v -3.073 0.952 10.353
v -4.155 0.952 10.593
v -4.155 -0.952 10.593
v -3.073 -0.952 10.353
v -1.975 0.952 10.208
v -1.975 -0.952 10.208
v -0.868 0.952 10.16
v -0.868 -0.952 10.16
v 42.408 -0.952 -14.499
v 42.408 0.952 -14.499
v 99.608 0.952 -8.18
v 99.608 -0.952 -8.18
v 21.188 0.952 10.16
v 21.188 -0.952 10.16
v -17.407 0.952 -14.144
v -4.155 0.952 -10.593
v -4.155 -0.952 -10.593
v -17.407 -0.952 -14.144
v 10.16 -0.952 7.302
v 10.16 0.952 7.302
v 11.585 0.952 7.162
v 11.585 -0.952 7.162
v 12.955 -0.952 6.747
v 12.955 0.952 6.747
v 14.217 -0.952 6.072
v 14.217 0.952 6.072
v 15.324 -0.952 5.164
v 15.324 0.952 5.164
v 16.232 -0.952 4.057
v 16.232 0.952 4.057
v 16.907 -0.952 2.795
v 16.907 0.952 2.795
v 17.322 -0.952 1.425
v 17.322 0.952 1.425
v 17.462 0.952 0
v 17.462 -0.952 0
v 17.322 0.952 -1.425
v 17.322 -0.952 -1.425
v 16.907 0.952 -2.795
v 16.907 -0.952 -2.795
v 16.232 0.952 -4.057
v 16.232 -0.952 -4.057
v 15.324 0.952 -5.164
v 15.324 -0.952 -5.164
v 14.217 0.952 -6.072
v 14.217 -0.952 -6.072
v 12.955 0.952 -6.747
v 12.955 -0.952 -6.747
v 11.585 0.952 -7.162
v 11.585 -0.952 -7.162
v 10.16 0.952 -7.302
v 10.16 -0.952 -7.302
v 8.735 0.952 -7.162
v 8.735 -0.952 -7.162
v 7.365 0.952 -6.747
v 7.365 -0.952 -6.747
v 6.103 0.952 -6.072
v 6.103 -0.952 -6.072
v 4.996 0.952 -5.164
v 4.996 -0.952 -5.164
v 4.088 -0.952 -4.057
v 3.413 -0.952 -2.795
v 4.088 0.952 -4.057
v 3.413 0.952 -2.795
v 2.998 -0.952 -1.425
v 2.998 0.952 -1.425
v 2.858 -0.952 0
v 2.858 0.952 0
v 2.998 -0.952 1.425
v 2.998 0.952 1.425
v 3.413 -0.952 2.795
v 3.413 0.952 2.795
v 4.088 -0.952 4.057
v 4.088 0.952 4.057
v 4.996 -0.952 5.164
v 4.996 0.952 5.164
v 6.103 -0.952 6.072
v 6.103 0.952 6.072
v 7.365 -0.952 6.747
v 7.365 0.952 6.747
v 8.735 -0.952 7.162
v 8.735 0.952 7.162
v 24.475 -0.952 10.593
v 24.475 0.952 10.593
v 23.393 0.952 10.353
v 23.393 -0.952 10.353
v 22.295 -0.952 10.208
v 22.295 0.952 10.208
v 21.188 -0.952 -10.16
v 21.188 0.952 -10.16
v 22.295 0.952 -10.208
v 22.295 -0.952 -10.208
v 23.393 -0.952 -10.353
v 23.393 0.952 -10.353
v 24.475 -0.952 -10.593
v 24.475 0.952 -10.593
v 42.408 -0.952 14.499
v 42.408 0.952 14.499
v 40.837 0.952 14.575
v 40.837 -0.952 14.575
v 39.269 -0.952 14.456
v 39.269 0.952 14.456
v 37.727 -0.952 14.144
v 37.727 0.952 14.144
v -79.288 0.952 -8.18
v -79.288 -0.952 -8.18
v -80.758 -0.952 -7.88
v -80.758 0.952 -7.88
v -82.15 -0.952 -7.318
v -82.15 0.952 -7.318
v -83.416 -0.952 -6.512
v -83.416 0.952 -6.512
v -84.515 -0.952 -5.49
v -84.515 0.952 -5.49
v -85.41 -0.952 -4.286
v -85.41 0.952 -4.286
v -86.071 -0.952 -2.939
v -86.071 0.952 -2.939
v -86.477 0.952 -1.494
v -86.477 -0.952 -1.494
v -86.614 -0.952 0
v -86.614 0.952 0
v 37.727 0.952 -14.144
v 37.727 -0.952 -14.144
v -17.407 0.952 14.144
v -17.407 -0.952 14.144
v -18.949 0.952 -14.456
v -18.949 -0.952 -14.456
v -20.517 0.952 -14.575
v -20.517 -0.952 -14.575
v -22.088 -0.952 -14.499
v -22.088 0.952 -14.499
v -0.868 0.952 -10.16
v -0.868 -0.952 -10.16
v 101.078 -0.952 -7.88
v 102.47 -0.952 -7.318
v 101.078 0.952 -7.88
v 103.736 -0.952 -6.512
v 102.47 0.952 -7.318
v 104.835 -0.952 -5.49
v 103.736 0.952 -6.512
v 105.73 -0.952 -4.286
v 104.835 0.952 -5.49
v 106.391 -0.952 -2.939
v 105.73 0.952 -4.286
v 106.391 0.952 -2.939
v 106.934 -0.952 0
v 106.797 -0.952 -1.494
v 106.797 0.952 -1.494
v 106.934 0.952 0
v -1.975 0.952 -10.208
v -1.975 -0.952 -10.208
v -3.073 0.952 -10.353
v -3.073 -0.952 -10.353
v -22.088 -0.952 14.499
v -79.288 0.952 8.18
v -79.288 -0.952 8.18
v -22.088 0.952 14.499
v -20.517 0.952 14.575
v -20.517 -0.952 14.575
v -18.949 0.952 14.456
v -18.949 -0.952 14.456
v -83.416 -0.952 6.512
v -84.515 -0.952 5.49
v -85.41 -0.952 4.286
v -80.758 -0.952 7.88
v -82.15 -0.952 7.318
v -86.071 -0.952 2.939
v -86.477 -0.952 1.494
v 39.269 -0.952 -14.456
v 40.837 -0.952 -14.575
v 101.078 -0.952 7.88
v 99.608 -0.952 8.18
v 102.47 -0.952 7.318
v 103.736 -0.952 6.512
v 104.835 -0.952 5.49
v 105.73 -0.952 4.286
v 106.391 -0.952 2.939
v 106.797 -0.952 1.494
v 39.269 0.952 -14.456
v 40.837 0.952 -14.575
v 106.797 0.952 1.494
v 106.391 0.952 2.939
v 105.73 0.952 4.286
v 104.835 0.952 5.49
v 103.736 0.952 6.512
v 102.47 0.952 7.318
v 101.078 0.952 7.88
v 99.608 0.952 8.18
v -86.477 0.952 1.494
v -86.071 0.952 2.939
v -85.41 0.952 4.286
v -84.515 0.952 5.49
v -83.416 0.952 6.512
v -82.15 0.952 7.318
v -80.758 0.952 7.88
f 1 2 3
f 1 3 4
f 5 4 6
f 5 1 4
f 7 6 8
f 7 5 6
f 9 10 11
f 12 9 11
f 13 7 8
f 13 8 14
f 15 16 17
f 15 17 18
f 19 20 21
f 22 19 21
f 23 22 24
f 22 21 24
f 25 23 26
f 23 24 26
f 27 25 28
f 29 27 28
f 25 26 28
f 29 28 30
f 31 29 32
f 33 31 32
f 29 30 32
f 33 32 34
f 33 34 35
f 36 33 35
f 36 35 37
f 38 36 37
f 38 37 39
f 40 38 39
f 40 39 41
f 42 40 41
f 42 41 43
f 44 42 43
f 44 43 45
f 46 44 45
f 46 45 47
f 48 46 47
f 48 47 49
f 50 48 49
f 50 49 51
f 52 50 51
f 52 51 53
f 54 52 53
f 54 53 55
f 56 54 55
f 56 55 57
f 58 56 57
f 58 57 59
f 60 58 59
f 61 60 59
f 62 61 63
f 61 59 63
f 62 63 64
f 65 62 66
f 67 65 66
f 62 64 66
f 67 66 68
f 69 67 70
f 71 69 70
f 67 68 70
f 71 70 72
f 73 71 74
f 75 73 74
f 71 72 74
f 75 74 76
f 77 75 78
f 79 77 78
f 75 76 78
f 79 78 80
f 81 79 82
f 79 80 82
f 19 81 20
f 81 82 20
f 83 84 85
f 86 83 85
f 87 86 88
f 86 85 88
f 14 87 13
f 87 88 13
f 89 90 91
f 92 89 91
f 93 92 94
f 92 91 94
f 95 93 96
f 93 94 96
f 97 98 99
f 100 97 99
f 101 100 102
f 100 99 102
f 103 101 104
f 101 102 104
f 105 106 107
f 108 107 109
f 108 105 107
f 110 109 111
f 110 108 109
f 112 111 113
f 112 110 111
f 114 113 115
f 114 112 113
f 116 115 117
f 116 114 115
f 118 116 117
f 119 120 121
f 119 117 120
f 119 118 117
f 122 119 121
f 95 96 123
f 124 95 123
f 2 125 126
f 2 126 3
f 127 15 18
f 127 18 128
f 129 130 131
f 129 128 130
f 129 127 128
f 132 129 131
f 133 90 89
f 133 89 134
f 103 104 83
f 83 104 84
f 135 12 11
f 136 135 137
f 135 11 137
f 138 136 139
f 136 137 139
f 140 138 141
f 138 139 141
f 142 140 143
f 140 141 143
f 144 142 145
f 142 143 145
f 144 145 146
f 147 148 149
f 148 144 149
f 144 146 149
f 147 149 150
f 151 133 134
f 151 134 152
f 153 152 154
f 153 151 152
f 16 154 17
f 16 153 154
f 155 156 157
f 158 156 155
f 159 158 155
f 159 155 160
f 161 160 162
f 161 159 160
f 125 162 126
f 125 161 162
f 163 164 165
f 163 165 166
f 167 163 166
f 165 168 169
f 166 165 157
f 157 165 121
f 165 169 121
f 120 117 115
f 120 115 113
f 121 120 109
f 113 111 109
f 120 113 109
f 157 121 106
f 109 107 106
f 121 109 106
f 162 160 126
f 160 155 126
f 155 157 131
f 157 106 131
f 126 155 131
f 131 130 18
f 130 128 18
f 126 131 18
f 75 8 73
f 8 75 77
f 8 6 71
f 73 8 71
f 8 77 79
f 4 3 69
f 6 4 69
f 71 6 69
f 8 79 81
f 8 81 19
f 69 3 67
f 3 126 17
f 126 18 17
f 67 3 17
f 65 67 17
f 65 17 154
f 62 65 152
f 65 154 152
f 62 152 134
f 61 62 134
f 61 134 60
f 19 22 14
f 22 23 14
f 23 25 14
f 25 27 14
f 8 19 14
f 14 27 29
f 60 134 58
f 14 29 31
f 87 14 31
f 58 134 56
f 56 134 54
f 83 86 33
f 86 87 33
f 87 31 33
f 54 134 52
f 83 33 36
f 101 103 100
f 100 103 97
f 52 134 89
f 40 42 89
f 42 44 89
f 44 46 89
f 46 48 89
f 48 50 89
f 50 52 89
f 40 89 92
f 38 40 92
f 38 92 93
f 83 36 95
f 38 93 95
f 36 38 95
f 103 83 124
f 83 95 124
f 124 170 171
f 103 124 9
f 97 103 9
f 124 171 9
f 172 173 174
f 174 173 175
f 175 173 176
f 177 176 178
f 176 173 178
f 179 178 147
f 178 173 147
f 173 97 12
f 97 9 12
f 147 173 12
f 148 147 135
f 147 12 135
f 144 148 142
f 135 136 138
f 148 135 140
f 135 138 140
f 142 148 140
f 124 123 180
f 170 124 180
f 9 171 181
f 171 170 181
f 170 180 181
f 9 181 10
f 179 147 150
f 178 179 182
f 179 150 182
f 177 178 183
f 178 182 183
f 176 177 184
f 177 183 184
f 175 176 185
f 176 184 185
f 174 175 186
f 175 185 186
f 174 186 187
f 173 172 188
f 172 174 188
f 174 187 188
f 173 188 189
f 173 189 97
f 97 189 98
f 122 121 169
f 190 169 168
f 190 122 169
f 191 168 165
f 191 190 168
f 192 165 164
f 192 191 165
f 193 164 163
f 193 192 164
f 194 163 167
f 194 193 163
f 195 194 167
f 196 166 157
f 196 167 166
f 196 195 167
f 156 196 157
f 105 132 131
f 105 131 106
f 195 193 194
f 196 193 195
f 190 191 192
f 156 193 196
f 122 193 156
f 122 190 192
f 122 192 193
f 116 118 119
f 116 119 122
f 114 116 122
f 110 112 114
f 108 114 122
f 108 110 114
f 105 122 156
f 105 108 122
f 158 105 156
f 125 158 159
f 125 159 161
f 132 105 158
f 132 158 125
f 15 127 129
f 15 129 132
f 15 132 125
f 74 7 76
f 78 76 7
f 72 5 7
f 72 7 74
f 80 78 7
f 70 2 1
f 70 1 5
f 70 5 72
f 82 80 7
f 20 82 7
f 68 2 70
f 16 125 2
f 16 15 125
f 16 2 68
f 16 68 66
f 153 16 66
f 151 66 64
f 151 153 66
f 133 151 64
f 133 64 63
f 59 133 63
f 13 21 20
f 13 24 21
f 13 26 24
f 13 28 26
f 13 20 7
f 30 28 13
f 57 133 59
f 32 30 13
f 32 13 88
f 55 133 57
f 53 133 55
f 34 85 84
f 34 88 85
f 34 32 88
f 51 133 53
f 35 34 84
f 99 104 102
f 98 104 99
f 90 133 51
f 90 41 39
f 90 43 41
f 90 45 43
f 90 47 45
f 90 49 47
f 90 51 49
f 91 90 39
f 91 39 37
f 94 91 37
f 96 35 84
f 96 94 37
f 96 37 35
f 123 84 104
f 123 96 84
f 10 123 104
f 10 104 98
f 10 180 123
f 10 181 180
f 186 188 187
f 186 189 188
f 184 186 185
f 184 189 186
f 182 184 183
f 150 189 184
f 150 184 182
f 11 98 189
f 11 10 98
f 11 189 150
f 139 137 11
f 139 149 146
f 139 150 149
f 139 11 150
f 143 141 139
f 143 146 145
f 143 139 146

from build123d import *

# Parameters (mm, degrees)
LOFT1_START        = -0.9525
LOFT1_DEPTH        = 1.905
CUT_EXTRUDE2_DEPTH = 110.33494104
SKETCH5_R          = 7.3025
CUT_EXTRUDE3_DEPTH = 108.939694094


with BuildPart() as part:
    # Loft1: read off the stored shape, not the designer's step
    # Loft1 outline → Loft1 (new body)
    with BuildSketch(Plane(origin=(0, 0, 0), x_dir=(1, 0, 0), z_dir=(0, 1, 0)).offset(LOFT1_START)):
        with BuildLine():
            add(Edge.make_bspline(
                [(0, -15.875), (21.314656151, -21.106845313), (57.417925413, -25.838728987), (92.603989484, -17.720178647), (106.934, -10.795)],
                knots=[0, 0, 0, 0, 0.588632913, 1, 1, 1, 1], degree=3))
            Line((106.934, -10.795), (106.934, 10.795))
            add(Edge.make_bspline(
                [(0, 15.875), (21.314656151, 21.106845313), (57.417925413, 25.838728987), (92.603989484, 17.720178647), (106.934, 10.795)],
                knots=[0, 0, 0, 0, 0.588632913, 1, 1, 1, 1], degree=3))
            Line((0, 15.875), (0, -15.875))
        make_face()
    extrude(amount=LOFT1_DEPTH)

    # Sketch4 → Cut-Extrude2 (cut, through all)
    with BuildSketch(Plane(origin=(0, 0.9525, 0), x_dir=(1, 0, 0), z_dir=(0, 1, 0))):
        with BuildLine():
            Line((0, 15.875), (0, 3e-09))
            ThreePointArc((0, 3e-09), (2.975795104, 7.184204898), (10.16, 10.16))
            Line((10.16, 10.16), (21.188013281, 10.16))
            ThreePointArc((21.188013281, 10.16), (22.845695922, 10.268650261), (24.475015153, 10.592742006))
            Line((24.475015153, 10.592742006), (37.72679711, 14.14354628))
            ThreePointArc((37.72679711, 14.14354628), (40.05104351, 14.539743655), (42.408472673, 14.499476682))
            Line((42.408472673, 14.499476682), (99.60820705, 8.179760764))
            ThreePointArc((99.60820705, 8.179760764), (104.834824793, 5.490348999), (106.934, 0))
            Line((106.934, 0), (106.934, 10.795))
            add(Edge.make_bspline(
                [(0, 15.875), (21.314656151, 21.106845313), (57.417925413, 25.838728987), (92.603989484, 17.720178647), (106.934, 10.795)],
                knots=[0, 0, 0, 0, 0.588632913, 1, 1, 1, 1], degree=3))
        make_face()
        with BuildLine():
            Line((21.188013281, -10.16), (10.16, -10.16))
            ThreePointArc((10.16, -10.16), (2.975795102, -7.184204896), (0, 3e-09))
            Line((0, 3e-09), (0, -15.875))
            add(Edge.make_bspline(
                [(0, -15.875), (21.314656151, -21.106845313), (57.417925413, -25.838728987), (92.603989484, -17.720178647), (106.934, -10.795)],
                knots=[0, 0, 0, 0, 0.588632913, 1, 1, 1, 1], degree=3))
            Line((106.934, -10.795), (106.934, 0))
            ThreePointArc((106.934, 0), (104.834824793, -5.490348999), (99.60820705, -8.179760764))
            Line((99.60820705, -8.179760764), (42.408472673, -14.499476682))
            ThreePointArc((42.408472673, -14.499476682), (40.05104351, -14.539743655), (37.72679711, -14.14354628))
            Line((37.72679711, -14.14354628), (24.475015153, -10.592742006))
            ThreePointArc((24.475015153, -10.592742006), (22.845695922, -10.268650261), (21.188013281, -10.16))
        make_face()
    extrude(amount=-CUT_EXTRUDE2_DEPTH, mode=Mode.SUBTRACT)

    # Sketch5 → Cut-Extrude3 (cut, through all)
    with BuildSketch(Plane(origin=(0, 0.9525, 0), x_dir=(1, 0, 0), z_dir=(0, 1, 0))):
        with Locations(Location((10.16, 0, 0), (0, 0, 270))):
            Circle(SKETCH5_R)
    extrude(amount=-CUT_EXTRUDE3_DEPTH, mode=Mode.SUBTRACT)

    # Mirror1: part across plane


with BuildPart() as part_1:
    add(part.part)
    add(part.part.mirror(Plane(origin=(10.16, 0, 0), x_dir=(0, 0, 1), z_dir=(1, 0, 0))))


solid = part_1.part
